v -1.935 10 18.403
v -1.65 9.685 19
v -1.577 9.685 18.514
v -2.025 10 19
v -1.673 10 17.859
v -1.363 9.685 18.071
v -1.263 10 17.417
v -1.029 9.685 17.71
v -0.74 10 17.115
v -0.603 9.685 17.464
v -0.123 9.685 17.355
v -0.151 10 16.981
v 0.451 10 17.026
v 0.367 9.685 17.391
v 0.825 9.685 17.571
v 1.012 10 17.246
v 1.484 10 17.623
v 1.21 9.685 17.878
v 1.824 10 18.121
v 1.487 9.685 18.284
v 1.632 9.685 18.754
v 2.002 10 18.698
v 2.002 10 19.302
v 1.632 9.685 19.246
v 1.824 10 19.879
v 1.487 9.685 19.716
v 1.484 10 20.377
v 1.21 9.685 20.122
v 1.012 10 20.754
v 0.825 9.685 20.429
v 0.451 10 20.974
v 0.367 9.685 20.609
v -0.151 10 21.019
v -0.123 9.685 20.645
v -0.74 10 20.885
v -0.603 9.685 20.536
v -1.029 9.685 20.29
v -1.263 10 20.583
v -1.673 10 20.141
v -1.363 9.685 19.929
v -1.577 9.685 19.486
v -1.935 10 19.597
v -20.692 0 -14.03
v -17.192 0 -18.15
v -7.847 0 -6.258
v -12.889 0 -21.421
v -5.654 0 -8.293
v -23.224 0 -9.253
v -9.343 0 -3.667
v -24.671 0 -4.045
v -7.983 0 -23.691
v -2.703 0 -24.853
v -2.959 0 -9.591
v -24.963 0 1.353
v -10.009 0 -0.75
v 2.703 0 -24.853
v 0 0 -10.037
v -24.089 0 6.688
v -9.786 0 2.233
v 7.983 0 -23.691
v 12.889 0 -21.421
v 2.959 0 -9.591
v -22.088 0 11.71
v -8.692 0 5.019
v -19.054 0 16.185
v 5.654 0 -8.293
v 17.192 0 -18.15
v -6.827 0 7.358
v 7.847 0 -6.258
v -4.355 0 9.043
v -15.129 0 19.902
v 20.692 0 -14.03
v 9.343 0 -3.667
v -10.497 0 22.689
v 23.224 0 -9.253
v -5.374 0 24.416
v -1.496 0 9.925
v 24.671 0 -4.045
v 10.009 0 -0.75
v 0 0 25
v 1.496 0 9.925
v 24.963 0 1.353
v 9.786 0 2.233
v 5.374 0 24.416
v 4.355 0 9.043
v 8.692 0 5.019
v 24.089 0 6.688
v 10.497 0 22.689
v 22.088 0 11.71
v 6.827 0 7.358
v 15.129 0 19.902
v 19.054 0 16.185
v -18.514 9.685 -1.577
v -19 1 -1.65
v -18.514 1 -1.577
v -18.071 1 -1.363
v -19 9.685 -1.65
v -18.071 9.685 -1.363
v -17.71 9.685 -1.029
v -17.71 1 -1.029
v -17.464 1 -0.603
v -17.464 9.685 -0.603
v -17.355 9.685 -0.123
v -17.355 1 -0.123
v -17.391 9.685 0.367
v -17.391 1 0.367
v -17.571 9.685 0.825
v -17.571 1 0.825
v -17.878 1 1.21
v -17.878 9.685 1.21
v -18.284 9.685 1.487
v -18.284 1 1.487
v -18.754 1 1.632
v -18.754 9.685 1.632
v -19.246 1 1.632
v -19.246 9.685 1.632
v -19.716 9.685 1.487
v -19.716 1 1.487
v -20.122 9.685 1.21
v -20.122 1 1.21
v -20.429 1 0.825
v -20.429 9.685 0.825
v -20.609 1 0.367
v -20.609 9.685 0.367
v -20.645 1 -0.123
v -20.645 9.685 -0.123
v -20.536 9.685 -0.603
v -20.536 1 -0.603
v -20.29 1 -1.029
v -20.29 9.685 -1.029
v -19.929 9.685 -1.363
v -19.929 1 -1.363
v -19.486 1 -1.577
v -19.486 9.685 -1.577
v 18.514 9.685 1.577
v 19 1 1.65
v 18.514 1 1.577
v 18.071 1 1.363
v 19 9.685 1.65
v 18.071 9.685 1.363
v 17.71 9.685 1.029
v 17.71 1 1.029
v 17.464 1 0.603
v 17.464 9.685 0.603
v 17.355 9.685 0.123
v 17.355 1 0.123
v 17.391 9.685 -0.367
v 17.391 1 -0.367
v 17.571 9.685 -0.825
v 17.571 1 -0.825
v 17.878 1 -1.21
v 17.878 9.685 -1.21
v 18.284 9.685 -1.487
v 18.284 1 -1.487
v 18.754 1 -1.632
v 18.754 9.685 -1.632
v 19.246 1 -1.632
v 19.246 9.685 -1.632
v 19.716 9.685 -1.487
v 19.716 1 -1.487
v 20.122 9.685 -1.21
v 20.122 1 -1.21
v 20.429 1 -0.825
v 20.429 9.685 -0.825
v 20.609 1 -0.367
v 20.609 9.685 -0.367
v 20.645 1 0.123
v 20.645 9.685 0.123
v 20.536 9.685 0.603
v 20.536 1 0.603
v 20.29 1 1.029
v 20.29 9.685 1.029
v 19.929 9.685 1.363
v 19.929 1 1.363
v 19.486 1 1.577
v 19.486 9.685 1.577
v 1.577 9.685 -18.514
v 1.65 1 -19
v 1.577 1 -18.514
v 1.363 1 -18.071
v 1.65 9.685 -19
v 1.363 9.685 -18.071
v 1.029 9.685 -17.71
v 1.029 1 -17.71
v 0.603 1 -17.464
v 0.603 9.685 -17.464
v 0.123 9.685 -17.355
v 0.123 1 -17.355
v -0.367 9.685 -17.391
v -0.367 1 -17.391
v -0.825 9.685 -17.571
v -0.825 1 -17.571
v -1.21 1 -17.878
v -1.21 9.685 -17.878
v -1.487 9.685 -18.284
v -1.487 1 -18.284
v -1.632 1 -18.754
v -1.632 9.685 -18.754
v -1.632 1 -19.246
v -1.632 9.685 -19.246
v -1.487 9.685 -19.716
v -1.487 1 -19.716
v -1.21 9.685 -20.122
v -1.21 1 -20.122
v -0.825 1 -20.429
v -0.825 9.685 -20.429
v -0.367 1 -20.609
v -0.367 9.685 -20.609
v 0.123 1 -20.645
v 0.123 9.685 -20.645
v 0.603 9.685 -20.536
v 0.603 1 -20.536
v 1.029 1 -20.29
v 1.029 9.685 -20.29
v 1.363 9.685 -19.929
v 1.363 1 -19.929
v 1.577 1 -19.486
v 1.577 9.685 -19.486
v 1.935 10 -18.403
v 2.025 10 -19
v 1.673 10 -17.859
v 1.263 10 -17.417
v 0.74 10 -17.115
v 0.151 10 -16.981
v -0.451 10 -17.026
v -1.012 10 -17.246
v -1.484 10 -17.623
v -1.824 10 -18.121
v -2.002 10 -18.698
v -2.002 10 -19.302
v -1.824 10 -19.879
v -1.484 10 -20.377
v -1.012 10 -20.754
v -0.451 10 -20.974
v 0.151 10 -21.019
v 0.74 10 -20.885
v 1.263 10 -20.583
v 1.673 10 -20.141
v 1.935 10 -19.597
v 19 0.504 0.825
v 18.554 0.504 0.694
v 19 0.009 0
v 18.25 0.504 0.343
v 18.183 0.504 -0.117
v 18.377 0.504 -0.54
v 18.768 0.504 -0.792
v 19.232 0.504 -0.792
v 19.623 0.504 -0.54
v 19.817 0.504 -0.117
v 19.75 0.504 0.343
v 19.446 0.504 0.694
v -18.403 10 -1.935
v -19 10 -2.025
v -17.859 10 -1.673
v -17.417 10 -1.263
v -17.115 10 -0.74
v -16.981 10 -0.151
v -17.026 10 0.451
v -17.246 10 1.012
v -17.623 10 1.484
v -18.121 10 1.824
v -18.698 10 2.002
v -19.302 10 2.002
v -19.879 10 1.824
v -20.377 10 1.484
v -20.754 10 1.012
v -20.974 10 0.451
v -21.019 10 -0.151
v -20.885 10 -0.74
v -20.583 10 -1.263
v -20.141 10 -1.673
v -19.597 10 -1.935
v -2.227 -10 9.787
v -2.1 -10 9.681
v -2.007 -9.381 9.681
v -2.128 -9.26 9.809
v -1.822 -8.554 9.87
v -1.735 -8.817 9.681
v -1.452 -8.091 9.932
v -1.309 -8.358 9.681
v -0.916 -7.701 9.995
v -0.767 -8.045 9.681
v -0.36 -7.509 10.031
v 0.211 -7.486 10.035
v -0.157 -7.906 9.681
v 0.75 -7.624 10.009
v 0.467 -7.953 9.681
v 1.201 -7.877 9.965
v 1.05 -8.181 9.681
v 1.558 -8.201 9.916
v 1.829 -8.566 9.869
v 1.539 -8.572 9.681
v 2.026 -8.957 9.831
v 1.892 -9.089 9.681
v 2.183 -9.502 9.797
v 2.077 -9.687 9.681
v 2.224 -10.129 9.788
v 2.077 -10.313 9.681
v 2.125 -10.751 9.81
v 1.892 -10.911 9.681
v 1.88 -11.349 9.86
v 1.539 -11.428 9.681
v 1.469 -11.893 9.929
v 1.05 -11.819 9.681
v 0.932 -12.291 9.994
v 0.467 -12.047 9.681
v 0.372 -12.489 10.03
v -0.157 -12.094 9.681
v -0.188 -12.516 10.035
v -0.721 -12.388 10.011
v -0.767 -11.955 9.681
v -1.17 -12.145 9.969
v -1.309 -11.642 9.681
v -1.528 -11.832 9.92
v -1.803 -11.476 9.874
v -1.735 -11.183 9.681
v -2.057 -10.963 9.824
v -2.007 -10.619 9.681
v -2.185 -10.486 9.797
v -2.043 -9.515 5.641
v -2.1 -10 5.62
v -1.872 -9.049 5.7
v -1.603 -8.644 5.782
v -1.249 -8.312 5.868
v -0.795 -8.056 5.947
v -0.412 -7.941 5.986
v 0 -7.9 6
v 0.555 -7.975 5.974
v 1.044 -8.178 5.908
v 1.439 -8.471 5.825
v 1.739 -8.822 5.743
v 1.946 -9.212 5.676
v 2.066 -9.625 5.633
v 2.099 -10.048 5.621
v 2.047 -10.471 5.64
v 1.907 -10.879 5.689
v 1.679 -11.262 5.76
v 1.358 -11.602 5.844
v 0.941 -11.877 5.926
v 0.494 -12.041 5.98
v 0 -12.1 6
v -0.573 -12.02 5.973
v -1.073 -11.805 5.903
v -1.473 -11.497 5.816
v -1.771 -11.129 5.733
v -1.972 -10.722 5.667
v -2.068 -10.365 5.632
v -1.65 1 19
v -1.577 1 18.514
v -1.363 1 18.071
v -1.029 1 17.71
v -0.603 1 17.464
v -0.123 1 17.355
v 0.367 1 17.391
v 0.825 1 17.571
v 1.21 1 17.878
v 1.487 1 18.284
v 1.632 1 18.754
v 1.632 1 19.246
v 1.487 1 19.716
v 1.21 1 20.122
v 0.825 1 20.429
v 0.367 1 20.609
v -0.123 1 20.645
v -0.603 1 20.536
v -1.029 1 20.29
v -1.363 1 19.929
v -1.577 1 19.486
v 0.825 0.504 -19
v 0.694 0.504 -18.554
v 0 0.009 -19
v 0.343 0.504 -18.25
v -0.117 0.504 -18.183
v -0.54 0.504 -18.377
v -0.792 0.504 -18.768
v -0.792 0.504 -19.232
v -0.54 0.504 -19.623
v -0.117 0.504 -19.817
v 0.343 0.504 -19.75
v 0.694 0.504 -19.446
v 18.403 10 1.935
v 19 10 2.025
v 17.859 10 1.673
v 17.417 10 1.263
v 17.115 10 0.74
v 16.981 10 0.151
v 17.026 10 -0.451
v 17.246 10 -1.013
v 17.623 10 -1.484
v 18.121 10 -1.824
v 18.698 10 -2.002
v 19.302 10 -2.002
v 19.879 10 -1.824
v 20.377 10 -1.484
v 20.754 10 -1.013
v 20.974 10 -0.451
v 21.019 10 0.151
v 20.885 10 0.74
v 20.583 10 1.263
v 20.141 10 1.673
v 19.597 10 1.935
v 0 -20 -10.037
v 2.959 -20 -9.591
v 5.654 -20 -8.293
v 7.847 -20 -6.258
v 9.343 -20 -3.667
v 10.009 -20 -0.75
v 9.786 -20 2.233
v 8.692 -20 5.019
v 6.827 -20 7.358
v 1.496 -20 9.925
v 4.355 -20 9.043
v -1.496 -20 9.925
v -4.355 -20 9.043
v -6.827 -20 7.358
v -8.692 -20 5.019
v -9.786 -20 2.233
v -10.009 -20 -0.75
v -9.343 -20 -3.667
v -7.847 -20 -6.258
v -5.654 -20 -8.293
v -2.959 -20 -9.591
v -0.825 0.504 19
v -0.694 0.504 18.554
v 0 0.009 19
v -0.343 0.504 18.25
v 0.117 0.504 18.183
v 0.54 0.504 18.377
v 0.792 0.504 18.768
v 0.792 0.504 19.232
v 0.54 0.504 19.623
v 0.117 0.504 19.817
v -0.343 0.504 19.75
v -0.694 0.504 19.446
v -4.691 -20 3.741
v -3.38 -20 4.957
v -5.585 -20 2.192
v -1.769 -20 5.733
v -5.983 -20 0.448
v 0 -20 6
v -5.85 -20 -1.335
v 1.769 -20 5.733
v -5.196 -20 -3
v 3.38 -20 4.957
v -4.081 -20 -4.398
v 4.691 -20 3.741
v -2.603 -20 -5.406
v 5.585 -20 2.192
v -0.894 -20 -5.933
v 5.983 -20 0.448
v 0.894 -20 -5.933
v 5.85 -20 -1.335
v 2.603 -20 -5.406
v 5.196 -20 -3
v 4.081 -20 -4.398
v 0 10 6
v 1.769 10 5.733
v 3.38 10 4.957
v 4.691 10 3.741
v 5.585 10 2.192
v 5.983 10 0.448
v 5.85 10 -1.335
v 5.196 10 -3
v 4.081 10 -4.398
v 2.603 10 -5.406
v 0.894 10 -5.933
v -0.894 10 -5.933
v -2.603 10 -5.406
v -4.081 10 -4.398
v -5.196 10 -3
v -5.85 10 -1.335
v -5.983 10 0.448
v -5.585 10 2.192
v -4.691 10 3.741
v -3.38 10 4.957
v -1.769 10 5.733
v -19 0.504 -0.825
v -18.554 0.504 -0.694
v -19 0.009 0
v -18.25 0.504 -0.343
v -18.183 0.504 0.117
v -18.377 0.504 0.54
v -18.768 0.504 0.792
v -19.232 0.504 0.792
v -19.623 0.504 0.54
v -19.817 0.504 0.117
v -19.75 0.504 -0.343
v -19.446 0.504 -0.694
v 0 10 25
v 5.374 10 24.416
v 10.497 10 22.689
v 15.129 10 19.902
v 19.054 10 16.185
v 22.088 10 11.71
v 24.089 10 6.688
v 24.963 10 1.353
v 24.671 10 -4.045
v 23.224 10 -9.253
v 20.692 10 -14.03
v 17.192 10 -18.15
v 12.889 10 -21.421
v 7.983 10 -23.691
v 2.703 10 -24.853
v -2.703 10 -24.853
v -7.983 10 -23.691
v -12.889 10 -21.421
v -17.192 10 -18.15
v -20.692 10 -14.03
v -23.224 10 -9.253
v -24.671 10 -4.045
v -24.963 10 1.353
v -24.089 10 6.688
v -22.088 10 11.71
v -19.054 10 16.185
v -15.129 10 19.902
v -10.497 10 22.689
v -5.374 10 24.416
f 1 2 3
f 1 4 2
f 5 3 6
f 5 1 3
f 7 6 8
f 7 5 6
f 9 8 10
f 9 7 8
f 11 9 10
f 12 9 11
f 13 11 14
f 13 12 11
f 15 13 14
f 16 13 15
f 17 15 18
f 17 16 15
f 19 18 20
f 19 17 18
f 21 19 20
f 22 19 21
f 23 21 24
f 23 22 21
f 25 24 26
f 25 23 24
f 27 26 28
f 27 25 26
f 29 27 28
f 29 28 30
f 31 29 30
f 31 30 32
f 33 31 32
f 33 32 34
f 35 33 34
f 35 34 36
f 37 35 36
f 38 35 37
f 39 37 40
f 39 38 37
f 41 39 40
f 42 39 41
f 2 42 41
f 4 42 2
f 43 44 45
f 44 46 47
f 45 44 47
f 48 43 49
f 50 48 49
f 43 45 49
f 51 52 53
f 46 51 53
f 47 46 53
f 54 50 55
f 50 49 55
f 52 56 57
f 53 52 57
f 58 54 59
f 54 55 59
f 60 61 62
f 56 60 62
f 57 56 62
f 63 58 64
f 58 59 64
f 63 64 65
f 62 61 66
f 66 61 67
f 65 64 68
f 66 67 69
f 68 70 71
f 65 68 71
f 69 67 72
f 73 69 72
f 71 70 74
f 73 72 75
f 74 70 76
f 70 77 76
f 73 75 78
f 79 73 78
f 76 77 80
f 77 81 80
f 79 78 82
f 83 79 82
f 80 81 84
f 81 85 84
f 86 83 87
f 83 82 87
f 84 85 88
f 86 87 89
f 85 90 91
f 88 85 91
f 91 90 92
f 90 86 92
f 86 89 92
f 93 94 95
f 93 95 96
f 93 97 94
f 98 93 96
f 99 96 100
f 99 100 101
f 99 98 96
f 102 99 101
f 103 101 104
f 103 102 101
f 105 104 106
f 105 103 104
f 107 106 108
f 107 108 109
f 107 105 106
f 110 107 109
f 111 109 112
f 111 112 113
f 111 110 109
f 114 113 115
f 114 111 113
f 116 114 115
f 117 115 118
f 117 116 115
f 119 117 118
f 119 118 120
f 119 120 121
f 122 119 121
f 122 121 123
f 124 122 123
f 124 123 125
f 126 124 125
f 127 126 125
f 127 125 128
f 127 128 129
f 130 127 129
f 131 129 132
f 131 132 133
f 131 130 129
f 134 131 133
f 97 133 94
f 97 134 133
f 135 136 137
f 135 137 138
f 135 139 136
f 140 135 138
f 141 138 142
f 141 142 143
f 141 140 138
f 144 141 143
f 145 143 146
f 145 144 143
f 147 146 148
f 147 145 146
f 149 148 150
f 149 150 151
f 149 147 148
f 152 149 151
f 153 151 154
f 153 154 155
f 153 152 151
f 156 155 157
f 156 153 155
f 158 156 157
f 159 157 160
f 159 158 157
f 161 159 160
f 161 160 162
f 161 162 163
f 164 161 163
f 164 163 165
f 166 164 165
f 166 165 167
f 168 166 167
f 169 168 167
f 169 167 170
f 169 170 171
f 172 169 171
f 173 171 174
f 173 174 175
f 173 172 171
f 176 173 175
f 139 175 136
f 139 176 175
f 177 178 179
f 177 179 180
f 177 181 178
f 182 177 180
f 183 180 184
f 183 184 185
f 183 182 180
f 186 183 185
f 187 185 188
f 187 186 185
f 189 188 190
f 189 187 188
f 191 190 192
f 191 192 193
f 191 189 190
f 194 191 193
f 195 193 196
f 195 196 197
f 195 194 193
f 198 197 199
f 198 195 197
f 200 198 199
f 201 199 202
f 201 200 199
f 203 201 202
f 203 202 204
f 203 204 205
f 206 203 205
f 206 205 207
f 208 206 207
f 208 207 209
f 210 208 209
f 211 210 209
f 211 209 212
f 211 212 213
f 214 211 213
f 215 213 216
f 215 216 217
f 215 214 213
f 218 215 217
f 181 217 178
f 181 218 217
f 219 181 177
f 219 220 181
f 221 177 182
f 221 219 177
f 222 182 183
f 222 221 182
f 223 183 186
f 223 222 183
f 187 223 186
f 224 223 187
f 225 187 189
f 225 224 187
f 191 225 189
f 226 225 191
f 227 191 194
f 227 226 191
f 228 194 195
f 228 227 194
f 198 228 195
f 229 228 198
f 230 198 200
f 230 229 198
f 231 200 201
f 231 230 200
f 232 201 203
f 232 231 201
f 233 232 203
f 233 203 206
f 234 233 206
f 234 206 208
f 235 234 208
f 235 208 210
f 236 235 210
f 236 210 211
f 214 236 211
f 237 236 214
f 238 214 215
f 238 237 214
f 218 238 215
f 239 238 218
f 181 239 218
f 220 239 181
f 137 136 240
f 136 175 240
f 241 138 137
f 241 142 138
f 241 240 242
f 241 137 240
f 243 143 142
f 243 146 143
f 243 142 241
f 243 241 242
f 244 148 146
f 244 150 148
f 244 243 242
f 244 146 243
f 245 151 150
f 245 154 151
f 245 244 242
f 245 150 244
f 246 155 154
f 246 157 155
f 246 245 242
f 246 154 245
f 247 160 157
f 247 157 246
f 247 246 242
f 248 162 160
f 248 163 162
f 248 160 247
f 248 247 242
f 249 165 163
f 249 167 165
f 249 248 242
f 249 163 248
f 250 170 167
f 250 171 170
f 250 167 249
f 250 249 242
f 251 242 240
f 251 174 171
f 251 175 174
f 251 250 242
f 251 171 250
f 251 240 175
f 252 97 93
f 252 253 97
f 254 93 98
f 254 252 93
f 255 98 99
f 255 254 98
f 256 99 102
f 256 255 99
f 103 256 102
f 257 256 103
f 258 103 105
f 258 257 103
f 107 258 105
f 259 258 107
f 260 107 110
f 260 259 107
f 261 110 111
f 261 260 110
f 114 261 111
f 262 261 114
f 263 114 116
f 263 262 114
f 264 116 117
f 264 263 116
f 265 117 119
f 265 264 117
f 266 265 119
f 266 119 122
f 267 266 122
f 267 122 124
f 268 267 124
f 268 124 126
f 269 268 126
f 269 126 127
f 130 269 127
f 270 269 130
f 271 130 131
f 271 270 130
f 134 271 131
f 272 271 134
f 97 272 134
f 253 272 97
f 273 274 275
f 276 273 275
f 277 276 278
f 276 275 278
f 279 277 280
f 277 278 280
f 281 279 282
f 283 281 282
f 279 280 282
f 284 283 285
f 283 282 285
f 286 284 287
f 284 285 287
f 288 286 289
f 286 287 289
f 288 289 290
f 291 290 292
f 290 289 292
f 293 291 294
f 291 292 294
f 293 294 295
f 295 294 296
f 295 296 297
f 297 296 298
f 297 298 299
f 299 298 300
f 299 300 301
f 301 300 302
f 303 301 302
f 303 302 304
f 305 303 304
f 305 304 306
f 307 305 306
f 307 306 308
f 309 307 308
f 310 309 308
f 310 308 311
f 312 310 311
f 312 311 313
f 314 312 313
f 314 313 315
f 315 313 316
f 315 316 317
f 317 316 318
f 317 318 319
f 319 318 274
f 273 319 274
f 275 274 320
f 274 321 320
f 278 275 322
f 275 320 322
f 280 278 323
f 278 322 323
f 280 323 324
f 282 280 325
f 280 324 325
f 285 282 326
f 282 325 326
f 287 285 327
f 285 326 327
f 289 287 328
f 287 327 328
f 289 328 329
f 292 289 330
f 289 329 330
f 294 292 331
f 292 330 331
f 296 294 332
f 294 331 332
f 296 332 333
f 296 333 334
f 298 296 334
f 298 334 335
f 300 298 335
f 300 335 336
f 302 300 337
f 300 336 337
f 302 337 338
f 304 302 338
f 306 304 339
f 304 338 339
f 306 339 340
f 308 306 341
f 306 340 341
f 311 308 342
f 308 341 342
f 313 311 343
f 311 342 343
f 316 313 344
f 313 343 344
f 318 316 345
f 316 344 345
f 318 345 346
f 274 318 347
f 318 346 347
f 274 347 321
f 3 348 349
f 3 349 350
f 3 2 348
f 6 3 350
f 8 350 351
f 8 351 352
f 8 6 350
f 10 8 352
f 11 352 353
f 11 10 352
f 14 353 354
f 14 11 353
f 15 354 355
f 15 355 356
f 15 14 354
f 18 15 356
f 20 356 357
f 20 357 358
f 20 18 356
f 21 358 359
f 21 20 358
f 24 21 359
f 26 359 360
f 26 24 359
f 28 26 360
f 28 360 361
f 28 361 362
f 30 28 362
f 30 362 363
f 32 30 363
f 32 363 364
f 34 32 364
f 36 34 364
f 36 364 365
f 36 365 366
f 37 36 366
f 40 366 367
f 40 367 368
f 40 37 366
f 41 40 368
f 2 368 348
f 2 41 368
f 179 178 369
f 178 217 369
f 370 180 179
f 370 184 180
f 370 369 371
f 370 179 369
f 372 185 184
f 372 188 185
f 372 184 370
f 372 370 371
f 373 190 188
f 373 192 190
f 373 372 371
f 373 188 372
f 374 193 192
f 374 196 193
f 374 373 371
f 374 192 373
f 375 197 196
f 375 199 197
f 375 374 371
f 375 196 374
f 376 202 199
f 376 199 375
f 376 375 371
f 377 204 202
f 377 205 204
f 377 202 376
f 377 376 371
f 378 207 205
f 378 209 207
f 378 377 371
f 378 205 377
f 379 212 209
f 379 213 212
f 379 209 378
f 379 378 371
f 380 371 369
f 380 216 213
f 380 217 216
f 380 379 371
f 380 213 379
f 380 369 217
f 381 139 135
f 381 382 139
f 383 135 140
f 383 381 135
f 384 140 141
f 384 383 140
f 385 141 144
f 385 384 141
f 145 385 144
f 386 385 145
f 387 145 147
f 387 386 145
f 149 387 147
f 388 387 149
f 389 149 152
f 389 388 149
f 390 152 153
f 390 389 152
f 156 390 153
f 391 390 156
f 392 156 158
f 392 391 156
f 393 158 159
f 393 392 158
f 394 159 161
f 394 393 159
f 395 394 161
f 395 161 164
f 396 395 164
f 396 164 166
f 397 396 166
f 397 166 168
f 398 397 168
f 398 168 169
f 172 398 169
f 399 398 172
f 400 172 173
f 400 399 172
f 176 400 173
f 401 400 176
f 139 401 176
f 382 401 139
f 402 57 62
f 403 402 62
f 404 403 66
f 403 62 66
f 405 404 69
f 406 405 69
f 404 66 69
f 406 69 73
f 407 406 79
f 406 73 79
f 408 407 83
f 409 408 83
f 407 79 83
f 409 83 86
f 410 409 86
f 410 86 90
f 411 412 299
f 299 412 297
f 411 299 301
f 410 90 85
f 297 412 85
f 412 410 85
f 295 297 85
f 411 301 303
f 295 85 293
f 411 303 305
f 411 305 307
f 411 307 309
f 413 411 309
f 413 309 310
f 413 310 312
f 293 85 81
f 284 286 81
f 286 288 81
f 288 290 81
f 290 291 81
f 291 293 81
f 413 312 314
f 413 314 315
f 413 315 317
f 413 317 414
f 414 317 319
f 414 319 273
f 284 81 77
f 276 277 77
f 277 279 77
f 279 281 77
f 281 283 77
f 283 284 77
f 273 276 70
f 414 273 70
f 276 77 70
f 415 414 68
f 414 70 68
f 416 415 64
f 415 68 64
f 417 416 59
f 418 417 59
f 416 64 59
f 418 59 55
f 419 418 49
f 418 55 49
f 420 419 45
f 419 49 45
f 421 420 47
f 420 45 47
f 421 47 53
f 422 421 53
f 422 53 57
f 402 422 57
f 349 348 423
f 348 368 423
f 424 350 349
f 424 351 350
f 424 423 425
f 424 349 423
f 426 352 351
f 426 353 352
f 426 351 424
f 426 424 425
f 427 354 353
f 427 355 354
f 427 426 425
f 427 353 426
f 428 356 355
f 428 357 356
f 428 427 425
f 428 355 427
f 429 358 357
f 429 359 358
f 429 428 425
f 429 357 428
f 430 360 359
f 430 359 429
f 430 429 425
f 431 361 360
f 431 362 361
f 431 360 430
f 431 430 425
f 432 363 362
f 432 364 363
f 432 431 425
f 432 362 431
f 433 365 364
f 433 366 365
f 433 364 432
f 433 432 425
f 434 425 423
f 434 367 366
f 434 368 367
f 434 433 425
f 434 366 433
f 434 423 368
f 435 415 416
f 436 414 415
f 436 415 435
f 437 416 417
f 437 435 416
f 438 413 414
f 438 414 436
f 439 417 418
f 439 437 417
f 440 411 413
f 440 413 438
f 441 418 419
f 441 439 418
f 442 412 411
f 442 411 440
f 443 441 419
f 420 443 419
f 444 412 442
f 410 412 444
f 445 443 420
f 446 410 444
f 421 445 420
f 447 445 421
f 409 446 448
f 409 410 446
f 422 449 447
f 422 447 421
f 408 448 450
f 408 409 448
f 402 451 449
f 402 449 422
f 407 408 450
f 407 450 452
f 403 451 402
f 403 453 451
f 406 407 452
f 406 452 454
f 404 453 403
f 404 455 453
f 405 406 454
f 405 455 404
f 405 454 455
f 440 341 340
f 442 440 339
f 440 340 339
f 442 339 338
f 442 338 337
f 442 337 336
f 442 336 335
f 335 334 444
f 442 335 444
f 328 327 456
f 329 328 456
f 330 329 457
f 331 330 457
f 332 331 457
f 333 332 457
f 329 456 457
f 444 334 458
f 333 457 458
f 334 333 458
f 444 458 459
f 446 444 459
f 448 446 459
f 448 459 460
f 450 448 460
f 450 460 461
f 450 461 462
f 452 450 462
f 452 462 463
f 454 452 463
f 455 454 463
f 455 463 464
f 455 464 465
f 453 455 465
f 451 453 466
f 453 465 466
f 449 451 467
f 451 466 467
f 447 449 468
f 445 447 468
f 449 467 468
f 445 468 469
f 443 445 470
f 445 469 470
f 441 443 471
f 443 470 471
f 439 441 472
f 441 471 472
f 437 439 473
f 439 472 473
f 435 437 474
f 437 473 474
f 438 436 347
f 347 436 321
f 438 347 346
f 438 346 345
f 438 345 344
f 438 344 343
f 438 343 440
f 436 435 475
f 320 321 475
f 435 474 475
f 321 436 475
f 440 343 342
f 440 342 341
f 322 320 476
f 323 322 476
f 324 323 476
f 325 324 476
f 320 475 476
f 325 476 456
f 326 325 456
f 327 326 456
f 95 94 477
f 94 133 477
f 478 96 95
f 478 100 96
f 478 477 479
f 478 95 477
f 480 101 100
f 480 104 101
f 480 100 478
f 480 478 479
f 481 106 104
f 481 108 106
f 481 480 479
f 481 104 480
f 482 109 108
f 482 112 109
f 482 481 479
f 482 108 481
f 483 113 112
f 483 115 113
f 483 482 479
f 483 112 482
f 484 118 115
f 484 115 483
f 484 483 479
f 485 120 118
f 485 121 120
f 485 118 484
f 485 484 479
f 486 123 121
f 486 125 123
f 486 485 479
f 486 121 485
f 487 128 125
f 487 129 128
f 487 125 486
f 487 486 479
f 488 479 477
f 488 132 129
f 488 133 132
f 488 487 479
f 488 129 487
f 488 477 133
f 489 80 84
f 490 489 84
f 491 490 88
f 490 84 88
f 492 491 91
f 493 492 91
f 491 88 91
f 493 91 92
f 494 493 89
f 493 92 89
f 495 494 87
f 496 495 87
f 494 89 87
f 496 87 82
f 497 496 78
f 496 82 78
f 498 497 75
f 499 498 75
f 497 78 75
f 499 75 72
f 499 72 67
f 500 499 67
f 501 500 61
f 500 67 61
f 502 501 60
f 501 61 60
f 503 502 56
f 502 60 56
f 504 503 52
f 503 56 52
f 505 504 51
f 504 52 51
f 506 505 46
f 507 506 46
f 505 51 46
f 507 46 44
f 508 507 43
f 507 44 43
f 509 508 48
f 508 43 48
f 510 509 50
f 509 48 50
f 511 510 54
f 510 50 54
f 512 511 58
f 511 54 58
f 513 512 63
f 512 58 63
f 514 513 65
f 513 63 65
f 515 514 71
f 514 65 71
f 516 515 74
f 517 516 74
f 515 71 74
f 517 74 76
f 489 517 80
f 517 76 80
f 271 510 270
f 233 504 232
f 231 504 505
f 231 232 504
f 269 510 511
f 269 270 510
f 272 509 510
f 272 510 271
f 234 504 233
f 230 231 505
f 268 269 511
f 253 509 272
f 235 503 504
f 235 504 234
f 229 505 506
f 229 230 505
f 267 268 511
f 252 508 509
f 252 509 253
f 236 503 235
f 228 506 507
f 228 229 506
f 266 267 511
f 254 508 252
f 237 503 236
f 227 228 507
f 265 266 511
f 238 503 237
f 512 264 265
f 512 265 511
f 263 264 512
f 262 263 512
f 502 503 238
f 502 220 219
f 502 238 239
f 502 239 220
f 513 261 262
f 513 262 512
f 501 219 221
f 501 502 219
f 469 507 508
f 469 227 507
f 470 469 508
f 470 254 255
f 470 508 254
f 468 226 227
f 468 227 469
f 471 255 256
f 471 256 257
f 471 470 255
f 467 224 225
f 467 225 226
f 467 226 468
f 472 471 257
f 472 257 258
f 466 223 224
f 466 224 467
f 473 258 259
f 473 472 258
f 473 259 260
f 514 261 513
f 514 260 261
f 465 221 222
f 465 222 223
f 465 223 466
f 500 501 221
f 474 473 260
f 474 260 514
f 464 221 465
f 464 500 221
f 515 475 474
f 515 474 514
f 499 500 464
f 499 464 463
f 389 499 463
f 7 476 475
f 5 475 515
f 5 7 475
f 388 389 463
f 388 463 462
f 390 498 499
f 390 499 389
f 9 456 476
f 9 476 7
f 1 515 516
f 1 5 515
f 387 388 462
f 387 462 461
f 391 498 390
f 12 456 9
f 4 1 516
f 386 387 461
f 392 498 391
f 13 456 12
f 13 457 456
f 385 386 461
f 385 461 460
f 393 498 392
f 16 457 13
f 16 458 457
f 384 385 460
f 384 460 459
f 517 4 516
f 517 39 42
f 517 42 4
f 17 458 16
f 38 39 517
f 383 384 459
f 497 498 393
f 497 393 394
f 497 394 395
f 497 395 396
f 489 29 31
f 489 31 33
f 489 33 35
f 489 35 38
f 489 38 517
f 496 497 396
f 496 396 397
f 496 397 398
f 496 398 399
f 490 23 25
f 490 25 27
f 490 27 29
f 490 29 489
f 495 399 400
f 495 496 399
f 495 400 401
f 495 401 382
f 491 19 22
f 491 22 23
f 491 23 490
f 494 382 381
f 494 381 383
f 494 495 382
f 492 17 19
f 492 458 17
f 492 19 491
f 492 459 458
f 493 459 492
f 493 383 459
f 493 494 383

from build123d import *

# Parameters (mm, degrees)
SKETCH1_R                       = 25
BOSS_EXTRUDE1_DEPTH             = 10
SKETCH2_R                       = 10.037234393
BOSS_EXTRUDE2_DEPTH             = 20
SKETCH3_R                       = 6
CUT_EXTRUDE1_DEPTH              = 47.368092477
CIRPATTERN1_COUNT               = 4
M5X0_8_TAPPED_HOLE1_D           = 4.2
M5X0_8_TAPPED_HOLE1_DEPTH       = 11
M5X0_8_TAPPED_HOLE1_CSINK_D     = 5.05
M5X0_8_TAPPED_HOLE1_CSINK_ANGLE = 100
M5X0_8_TAPPED_HOLE1_TIP         = 1.2618073


with BuildPart() as part:
    # Sketch1 → Boss-Extrude1 (new body)
    with BuildSketch(Plane(origin=(0, 0, 0), x_dir=(1, 0, 0), z_dir=(0, 1, 0))):
        with Locations(Location((0, 0, 0), (0, 0, 270))):
            Circle(SKETCH1_R)
    extrude(amount=BOSS_EXTRUDE1_DEPTH)

    # Sketch2 → Boss-Extrude2 (add)
    with BuildSketch(Plane.XZ):
        with Locations(Location((0, 0, 0), (0, 0, 270))):
            Circle(SKETCH2_R)
    extrude(amount=BOSS_EXTRUDE2_DEPTH)

    # Sketch3 → Cut-Extrude1 (cut, through all)
    with BuildSketch(Plane(origin=(0, 10, 0), x_dir=(1, 0, 0), z_dir=(0, 1, 0))):
        with Locations(Location((0, 0, 0), (0, 0, 270))):
            Circle(SKETCH3_R)
    extrude(amount=-CUT_EXTRUDE1_DEPTH, mode=Mode.SUBTRACT)

    # Sketch5 → M4x0.7 Tapped Hole1 (revolve, cut)
    with BuildSketch(Plane(origin=(19, 10, 0), x_dir=(0, 0, 1), z_dir=(1, 0, 0))):
        Polygon((0, 0), (0, 9.991420021), (1.65, 9), (1.65, 0.314662362), (2.025, 0), align=None)
    m4x0_7_tapped_hole1 = revolve(axis=Axis((19, 16.35, 0), (0, -1, 0)), mode=Mode.SUBTRACT)

    # CirPattern1: M4x0.7 Tapped Hole1 ×4 about axis
    cirpattern1_axis = Axis((0, 0, 0), (0, 1, 0))
    for i in range(1, CIRPATTERN1_COUNT):
        add(m4x0_7_tapped_hole1.rotate(cirpattern1_axis, i * 360 / CIRPATTERN1_COUNT), mode=Mode.SUBTRACT)

    # M5x0.8 Tapped Hole1
    with Locations(Plane.XY.offset(10.037234393)):
        with Locations((0, -10)):
            CounterSinkHole(M5X0_8_TAPPED_HOLE1_D / 2, M5X0_8_TAPPED_HOLE1_CSINK_D / 2, depth=M5X0_8_TAPPED_HOLE1_DEPTH, counter_sink_angle=M5X0_8_TAPPED_HOLE1_CSINK_ANGLE)
            with Locations((0, 0, -(M5X0_8_TAPPED_HOLE1_DEPTH + M5X0_8_TAPPED_HOLE1_TIP / 2))):  # 118° drill point
                Cone(0, M5X0_8_TAPPED_HOLE1_D / 2, M5X0_8_TAPPED_HOLE1_TIP, mode=Mode.SUBTRACT)


solid = part.part
